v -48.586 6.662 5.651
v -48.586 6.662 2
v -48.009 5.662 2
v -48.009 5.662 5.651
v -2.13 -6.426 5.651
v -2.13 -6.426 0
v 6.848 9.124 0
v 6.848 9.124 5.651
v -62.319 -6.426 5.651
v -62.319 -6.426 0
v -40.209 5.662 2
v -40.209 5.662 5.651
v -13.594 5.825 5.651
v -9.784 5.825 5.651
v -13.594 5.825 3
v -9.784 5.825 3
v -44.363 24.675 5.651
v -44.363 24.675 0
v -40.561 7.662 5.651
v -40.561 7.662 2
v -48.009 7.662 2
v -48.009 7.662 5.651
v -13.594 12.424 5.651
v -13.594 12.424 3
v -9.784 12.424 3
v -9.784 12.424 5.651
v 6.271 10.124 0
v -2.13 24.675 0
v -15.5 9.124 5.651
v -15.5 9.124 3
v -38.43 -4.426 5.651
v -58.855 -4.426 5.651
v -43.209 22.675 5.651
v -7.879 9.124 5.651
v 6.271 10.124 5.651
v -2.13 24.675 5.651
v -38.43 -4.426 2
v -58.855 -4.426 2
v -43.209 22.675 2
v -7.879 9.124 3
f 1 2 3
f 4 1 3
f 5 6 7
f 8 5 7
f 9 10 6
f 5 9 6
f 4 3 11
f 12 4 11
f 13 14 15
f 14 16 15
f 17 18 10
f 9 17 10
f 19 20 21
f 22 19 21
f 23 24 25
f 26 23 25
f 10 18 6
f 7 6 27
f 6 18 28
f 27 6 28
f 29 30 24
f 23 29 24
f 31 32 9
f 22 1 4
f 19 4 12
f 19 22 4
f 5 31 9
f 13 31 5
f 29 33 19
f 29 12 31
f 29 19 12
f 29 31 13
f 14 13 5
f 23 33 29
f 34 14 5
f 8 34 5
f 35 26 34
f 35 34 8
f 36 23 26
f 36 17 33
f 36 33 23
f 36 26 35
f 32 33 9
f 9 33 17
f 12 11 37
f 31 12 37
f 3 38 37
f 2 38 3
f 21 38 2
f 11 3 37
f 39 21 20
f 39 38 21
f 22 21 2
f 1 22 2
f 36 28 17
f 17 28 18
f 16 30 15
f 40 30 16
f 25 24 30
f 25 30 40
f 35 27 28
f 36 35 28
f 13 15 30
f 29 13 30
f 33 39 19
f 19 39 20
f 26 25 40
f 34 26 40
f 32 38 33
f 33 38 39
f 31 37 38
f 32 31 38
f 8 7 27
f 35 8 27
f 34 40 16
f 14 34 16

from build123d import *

# Parameters (mm, degrees)
F1_DEPTH = 2
F2_DEPTH = 5.6506898254
F3_DEPTH = 3


with BuildPart() as f1:
    # F0 (on Top) → F1 (new body)
    with BuildSketch(Plane.XY):
        Polygon((-43.2085677565, 22.6745967576), (-58.8549531333, -4.4257376699), (-38.4300476107, -4.4257376699), (-40.2088151152, 5.6621541398), (-48.0090622621, 5.6621541398), (-48.5864125313, 6.6621541398), (-48.0090622621, 7.6621541398), (-40.5614690766, 7.6621541398), align=None)
    extrude(amount=F1_DEPTH)



with BuildPart() as f1b:
    # F0 (on Top) → F1, piece 2 (new body)
    with BuildSketch(Plane.XY):
        Polygon((-41.2085677565, 22.6745967576), (-36.4300476107, -4.4257376699), (-25.5239465254, -4.4257376699), (-23.5239465254, -4.4257376699), (-23.1770010553, -4.4257376699), (-25.5239465254, 8.8844515061), (-33.4898163741, 8.8844515061), (-34.0671666433, 9.8844515061), (-33.4898163741, 10.8844515061), (-22.7936475677, 10.8844515061), (-20.0940481363, -4.4257376699), (-3.2846095154, -4.4257376699), (4.538583173, 9.1244295439), (-3.2846095154, 22.6745967576), (-20.0940481363, 22.6745967576), (-24.4790815038, 15.0794961721), (-25.6024042349, 14.7936511306), (-33.2868439501, 22.6745967576), align=None)
        Polygon((-15.4996355878, 9.1244295439), (-13.5944822068, 12.424251996), (-9.7841754448, 12.424251996), (-7.8790220638, 9.1244295439), (-9.7841754448, 5.8246070917), (-13.5944822068, 5.8246070917), align=None, mode=Mode.SUBTRACT)
    extrude(amount=F1_DEPTH)


with BuildPart() as f1_1:
    add(f1.part)

    add(f1b.part)  # F2 merges F1b
    # F0 (on Top) → F2 (join)
    with BuildSketch(Plane.XY):
        Polygon((-20.0940481363, 24.6745967576), (-44.3632682949, 24.6745967576), (-62.3190547484, -6.4257376699), (-38.9180315569, -6.4257376699), (-2.129908977, -6.4257376699), (6.8479842498, 9.1244295439), (6.2706339806, 10.1244295439), (-2.129908977, 24.6745967576), (-2.8602079346, 24.6745967576), align=None)
        Polygon((-38.4300476107, -4.4257376699), (-58.8549531333, -4.4257376699), (-43.2085677565, 22.6745967576), (-41.2085677565, 22.6745967576), (-33.2868439501, 22.6745967576), (-30.5356123181, 22.6745967576), (-20.0940481363, 22.6745967576), (-3.2846095154, 22.6745967576), (4.538583173, 9.1244295439), (-3.2846095154, -4.4257376699), (-20.0940481363, -4.4257376699), (-23.1770010553, -4.4257376699), (-23.5239465254, -4.4257376699), (-25.5239465254, -4.4257376699), (-36.4300476107, -4.4257376699), align=None, mode=Mode.SUBTRACT)
        Polygon((-41.2085677565, 22.6745967576), (-36.4300476107, -4.4257376699), (-25.5239465254, -4.4257376699), (-23.5239465254, -4.4257376699), (-23.1770010553, -4.4257376699), (-25.5239465254, 8.8844515061), (-33.4898163741, 8.8844515061), (-34.0671666433, 9.8844515061), (-33.4898163741, 10.8844515061), (-22.7936475677, 10.8844515061), (-20.0940481363, -4.4257376699), (-3.2846095154, -4.4257376699), (4.538583173, 9.1244295439), (-3.2846095154, 22.6745967576), (-20.0940481363, 22.6745967576), (-24.4790815038, 15.0794961721), (-25.6024042349, 14.7936511306), (-33.2868439501, 22.6745967576), align=None)
        Polygon((-15.4996355878, 9.1244295439), (-13.5944822068, 12.424251996), (-9.7841754448, 12.424251996), (-7.8790220638, 9.1244295439), (-9.7841754448, 5.8246070917), (-13.5944822068, 5.8246070917), align=None, mode=Mode.SUBTRACT)
        Polygon((-25.5239465254, 8.8844515061), (-23.1770010553, -4.4257376699), (-20.0940481363, -4.4257376699), (-22.7936475677, 10.8844515061), (-33.4898163741, 10.8844515061), (-34.0671666433, 9.8844515061), (-33.4898163741, 8.8844515061), align=None)
        Polygon((-40.2088151152, 5.6621541398), (-38.4300476107, -4.4257376699), (-36.4300476107, -4.4257376699), (-41.2085677565, 22.6745967576), (-43.2085677565, 22.6745967576), (-40.5614690766, 7.6621541398), align=None)
        Polygon((-20.0940481363, 22.6745967576), (-30.5356123181, 22.6745967576), (-24.1704509766, 16.1898996279), (-24.4790815038, 15.0794961721), align=None)
        Polygon((-30.5356123181, 22.6745967576), (-33.2868439501, 22.6745967576), (-25.6024042349, 14.7936511306), (-24.4790815038, 15.0794961721), (-24.1704509766, 16.1898996279), align=None)
        Polygon((-48.0090622621, 5.6621541398), (-40.2088151152, 5.6621541398), (-40.5614690766, 7.6621541398), (-48.0090622621, 7.6621541398), (-48.5864125313, 6.6621541398), align=None)
    extrude(amount=F2_DEPTH)

    # F0 (on Top) → F3 (join)
    with BuildSketch(Plane.XY):
        Polygon((-9.7841754448, 12.424251996), (-13.5944822068, 12.424251996), (-15.4996355878, 9.1244295439), (-13.5944822068, 5.8246070917), (-9.7841754448, 5.8246070917), (-7.8790220638, 9.1244295439), align=None)
    extrude(amount=F3_DEPTH)


solid = f1_1.part
